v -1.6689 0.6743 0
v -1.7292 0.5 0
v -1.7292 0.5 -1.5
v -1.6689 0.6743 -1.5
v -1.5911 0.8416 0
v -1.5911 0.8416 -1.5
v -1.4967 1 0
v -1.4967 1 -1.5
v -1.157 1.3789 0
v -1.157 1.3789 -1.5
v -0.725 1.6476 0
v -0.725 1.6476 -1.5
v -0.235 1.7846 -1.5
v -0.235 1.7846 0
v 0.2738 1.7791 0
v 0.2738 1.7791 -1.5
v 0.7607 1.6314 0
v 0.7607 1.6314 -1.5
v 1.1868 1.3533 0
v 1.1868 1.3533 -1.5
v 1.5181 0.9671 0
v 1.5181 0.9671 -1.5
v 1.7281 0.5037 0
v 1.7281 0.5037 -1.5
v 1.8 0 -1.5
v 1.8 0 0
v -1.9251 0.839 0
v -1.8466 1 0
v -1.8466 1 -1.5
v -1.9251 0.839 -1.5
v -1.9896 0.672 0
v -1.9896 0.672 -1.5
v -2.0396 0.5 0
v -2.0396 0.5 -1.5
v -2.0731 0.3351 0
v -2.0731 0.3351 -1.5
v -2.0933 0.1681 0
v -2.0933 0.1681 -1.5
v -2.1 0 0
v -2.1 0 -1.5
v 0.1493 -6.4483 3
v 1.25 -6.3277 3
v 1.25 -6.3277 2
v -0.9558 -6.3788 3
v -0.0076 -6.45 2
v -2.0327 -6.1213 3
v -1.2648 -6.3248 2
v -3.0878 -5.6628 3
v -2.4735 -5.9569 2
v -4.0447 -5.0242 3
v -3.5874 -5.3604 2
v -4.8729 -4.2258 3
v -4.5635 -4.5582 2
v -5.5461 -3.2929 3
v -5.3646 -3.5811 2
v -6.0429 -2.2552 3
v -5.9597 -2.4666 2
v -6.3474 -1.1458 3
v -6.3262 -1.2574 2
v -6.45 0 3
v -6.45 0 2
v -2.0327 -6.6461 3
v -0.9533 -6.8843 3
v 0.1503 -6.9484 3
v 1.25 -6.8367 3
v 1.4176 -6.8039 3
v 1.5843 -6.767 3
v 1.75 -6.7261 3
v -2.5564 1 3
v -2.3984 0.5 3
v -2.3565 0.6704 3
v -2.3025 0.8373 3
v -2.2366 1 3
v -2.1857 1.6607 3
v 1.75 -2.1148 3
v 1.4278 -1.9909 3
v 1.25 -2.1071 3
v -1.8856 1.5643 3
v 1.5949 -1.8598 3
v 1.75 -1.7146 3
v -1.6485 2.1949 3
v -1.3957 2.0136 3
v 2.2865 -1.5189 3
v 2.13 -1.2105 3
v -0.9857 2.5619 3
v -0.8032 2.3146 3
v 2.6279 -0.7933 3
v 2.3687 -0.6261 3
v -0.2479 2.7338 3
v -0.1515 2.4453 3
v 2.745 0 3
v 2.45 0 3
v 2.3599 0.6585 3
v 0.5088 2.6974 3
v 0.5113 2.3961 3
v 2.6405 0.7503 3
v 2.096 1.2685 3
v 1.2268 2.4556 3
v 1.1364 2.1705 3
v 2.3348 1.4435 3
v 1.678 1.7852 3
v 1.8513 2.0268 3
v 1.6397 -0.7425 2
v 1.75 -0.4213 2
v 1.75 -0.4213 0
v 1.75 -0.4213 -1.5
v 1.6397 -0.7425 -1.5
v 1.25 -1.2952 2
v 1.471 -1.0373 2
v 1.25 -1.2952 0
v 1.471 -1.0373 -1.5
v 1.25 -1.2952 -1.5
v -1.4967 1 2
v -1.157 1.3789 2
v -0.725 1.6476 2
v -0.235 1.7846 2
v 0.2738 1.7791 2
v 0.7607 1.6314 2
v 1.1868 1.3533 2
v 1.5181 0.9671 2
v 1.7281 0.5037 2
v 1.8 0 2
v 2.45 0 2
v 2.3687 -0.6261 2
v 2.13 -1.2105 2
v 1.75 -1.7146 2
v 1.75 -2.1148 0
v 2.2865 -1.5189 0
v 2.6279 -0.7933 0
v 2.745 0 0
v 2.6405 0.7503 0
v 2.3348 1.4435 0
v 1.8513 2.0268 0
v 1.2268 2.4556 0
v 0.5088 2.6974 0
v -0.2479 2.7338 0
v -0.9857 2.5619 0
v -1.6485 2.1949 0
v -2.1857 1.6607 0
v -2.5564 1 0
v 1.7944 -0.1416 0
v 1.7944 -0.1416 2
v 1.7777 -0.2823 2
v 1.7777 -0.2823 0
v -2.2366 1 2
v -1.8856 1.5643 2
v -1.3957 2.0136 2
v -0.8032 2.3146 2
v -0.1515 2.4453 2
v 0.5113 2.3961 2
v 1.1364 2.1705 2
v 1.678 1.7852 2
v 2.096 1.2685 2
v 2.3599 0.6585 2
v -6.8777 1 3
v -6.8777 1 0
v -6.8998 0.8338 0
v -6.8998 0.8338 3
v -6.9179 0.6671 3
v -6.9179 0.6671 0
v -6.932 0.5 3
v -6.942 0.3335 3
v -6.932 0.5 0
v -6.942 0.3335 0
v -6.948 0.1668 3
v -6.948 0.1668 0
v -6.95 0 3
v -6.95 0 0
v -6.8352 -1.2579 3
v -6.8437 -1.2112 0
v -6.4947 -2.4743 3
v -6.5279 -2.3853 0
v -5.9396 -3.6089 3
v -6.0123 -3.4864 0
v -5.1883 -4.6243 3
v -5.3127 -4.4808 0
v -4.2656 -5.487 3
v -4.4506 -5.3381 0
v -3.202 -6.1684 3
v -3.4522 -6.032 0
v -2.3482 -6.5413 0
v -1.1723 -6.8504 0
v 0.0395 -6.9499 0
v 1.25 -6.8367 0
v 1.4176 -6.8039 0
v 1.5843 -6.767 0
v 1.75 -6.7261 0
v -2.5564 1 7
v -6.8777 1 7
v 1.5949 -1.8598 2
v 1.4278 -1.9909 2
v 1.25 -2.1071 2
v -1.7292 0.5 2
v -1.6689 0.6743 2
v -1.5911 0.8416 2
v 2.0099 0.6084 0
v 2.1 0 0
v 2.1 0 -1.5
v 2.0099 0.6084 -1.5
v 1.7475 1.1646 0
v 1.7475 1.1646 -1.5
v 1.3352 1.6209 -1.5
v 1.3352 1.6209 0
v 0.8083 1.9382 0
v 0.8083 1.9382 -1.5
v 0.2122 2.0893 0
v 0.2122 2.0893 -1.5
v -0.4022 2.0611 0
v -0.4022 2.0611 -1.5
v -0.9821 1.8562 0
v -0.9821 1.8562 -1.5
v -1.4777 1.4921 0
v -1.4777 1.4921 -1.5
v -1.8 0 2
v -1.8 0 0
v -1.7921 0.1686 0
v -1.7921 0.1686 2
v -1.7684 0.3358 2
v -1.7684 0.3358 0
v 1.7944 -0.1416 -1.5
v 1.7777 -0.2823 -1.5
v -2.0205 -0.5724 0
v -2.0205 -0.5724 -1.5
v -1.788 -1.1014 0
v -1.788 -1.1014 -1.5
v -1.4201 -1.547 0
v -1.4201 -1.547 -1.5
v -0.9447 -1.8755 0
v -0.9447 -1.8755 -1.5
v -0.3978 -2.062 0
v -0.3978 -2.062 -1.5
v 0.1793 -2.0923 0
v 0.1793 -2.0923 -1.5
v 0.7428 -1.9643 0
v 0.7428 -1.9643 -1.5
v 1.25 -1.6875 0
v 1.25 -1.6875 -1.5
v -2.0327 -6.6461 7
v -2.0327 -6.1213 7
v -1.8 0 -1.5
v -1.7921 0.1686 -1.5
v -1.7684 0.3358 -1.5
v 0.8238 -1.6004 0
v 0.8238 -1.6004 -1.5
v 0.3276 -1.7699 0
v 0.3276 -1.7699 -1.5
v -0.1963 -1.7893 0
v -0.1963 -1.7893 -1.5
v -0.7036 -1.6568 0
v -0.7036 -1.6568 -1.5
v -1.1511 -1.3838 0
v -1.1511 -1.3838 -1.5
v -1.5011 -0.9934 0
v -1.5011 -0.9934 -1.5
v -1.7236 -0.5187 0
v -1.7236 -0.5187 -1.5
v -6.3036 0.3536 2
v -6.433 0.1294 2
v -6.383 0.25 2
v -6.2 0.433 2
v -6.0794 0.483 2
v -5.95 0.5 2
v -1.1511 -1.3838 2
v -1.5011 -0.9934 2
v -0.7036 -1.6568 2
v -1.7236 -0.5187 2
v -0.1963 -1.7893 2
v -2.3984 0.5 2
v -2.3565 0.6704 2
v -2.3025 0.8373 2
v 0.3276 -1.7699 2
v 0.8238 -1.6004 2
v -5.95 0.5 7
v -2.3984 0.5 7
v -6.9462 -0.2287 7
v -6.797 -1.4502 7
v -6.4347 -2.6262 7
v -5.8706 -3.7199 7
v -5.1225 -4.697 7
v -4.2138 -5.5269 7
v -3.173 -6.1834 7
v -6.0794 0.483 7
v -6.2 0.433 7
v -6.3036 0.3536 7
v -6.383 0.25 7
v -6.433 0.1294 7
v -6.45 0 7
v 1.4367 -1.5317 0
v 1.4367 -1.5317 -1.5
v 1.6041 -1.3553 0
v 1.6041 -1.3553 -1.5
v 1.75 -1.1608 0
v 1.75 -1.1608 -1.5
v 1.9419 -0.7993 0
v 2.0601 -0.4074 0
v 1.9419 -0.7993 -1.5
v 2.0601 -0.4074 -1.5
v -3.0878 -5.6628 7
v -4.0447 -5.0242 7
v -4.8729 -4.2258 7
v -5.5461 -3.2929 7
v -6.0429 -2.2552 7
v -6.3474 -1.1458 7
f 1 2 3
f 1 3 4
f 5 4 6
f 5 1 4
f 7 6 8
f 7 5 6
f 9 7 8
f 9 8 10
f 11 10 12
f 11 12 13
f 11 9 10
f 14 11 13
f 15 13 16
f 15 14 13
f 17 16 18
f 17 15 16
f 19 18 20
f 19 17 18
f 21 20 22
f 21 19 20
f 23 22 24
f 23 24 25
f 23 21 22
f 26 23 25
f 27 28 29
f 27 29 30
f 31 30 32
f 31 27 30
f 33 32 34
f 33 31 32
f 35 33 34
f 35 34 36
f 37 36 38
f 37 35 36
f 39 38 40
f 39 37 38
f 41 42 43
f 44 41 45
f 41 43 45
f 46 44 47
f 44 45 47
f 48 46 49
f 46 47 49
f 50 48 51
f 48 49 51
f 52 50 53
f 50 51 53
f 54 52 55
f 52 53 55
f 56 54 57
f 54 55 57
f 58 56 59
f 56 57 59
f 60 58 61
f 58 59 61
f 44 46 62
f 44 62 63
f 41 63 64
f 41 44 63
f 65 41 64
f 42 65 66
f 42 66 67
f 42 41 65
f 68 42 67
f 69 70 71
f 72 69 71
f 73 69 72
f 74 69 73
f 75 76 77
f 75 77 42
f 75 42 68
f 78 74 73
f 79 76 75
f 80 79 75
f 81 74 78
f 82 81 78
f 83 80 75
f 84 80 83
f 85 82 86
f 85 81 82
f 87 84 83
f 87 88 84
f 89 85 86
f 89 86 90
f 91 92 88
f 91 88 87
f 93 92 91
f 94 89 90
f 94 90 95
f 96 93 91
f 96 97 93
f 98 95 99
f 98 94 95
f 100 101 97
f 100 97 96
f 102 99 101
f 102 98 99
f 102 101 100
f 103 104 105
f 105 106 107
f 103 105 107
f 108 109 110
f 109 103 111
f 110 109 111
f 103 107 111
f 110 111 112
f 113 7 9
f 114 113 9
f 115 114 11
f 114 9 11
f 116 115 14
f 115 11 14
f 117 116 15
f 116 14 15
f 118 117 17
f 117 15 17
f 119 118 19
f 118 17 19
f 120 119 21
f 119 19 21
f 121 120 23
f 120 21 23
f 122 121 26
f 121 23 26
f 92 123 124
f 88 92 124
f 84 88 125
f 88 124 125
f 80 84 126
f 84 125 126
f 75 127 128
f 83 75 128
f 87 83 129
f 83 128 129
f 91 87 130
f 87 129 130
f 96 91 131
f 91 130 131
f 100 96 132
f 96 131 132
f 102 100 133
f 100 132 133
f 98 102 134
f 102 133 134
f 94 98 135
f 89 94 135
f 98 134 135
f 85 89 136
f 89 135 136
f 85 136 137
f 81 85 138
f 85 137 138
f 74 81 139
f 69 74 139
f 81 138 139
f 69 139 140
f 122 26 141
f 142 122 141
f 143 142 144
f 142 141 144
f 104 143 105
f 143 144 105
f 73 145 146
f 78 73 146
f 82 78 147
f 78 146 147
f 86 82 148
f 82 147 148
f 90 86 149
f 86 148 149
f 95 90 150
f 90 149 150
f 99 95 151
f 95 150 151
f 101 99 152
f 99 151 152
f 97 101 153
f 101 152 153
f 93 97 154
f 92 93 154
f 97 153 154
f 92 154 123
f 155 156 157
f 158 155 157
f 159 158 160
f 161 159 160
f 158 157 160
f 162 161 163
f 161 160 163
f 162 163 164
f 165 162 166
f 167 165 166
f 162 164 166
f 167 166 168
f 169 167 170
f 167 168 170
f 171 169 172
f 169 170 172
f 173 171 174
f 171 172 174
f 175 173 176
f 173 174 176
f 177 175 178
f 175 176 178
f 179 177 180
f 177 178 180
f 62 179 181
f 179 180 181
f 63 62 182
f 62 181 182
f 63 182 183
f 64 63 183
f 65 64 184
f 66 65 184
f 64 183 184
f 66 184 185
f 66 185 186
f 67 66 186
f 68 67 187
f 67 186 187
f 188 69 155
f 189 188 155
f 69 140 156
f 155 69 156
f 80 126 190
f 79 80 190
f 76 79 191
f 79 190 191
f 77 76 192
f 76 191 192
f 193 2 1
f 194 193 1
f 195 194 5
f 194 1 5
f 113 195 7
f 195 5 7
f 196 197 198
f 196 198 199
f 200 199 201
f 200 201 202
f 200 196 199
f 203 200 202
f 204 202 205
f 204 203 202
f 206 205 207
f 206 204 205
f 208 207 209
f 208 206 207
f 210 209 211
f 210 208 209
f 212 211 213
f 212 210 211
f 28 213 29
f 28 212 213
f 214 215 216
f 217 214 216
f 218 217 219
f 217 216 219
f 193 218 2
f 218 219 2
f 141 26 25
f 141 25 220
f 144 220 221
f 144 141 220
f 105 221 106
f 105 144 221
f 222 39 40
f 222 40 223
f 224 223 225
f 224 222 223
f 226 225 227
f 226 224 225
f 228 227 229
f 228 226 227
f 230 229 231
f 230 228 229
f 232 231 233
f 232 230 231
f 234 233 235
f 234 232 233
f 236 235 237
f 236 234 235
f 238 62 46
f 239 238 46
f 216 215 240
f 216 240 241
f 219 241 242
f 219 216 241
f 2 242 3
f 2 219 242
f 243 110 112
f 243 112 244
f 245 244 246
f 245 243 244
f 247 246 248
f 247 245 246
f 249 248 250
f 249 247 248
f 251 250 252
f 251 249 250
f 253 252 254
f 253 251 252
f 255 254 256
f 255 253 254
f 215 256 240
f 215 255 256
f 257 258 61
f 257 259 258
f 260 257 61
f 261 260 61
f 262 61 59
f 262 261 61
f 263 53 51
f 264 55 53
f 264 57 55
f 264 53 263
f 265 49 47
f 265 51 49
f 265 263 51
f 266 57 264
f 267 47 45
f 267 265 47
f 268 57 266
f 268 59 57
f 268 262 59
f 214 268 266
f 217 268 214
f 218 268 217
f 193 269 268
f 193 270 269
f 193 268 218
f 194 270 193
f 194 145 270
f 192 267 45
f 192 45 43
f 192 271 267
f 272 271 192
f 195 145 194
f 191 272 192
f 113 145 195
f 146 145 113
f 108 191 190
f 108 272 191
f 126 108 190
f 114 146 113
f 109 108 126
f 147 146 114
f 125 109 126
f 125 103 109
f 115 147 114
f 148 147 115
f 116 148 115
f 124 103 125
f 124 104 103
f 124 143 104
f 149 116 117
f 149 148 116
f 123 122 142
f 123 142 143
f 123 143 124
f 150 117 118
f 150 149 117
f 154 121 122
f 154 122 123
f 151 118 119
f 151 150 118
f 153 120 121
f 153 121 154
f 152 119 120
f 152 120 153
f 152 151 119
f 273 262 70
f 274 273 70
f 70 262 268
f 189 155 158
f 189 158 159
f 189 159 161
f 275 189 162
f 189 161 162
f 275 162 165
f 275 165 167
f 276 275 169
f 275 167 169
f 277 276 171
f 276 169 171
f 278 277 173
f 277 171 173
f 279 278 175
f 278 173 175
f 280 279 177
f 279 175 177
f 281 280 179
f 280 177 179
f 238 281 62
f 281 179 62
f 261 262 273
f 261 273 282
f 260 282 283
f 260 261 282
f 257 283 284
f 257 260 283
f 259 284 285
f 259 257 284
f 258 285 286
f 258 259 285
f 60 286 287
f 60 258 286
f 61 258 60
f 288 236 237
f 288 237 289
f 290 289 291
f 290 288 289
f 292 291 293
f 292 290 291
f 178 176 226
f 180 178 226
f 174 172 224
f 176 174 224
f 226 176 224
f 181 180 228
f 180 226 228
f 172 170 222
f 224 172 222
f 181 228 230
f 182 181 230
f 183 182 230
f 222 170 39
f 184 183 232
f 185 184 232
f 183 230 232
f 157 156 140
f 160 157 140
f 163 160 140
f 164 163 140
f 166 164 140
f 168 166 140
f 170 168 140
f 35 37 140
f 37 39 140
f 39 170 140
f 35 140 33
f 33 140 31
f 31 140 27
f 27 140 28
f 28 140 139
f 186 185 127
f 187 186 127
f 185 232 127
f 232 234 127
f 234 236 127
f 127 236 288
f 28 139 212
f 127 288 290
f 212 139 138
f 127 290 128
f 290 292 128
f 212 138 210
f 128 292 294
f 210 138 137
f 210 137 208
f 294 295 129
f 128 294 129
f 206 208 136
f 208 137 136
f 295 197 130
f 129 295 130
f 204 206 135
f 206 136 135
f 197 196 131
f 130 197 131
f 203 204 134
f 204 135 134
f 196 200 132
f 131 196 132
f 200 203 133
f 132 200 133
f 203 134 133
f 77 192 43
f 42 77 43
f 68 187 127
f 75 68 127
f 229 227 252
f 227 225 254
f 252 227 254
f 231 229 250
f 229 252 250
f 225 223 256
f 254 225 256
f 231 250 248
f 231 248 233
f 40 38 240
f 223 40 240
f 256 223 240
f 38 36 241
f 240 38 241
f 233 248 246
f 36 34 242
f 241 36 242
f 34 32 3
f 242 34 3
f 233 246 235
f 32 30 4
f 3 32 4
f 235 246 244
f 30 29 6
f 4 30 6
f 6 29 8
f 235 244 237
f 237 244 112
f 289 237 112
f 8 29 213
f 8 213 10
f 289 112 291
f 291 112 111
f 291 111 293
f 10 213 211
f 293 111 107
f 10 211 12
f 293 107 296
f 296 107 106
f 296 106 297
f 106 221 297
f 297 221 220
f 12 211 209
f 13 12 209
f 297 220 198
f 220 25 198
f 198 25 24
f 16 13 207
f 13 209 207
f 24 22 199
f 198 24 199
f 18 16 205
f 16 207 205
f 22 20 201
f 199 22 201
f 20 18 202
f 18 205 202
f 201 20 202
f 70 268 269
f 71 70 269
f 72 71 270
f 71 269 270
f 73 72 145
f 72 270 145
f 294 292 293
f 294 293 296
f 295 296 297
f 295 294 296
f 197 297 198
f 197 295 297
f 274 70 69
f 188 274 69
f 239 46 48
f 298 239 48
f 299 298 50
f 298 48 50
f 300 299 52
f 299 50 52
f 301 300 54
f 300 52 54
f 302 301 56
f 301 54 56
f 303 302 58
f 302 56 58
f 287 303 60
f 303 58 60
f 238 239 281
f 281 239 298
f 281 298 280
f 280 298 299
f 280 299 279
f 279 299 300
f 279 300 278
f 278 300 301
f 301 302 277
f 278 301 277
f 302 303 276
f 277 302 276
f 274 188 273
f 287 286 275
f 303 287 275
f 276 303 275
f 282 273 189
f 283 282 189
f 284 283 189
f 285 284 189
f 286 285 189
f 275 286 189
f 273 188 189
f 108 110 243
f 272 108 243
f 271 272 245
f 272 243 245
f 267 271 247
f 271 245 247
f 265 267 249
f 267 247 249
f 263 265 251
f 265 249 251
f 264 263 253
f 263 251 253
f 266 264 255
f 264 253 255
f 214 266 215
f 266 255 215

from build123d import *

# Parameters (mm, degrees)
F1_DEPTH    = 2
F2_DEPTH    = 3
F3_DEPTH    = 1.5
F5_DEPTH    = 4
F6_T1_DEPTH = 6.2509414233


# Not quite as in the source:
# - a fillet or chamfer that OpenCascade refuses, or shapes differently, is made with other operations: its cross-section is extruded or revolved along the edge and cut away or added
# - a feature names something its author has since deleted; it is built from what else it names


with BuildPart() as f1:
    # F0 (on Top) → F1 (new body)
    with BuildSketch(Plane.XY):
        with BuildLine():
            ThreePointArc((-2.398436991, 0.5), (-2.3309771289, 0.7543511281), (-2.2366269246, 1))
            Line((-2.2366269246, 1), (-2.556369496, 1))
            ThreePointArc((-2.556369496, 1), (-2.6395896521, 0.7533866658), (-2.6990785465, 0.5))
            Line((-2.6990785465, 0.5), (-2.398436991, 0.5))
        make_face()
        with BuildLine():
            ThreePointArc((-2.2366269246, 1), (0.5112553348, 2.3960630173), (2.45, 0))
            ThreePointArc((2.45, 0), (2.2682592444, -0.9260129589), (1.75, -1.7146428199))
            Line((1.75, -1.7146428199), (1.75, -2.1148345089))
            ThreePointArc((1.75, -2.1148345089), (2.483825175, -1.1686049375), (2.745, 0))
            ThreePointArc((2.745, 0), (0.5088176164, 2.6974301906), (-2.556369496, 1))
            Line((-2.556369496, 1), (-2.2366269246, 1))
        make_face()
        with BuildLine():
            ThreePointArc((-2.6990785465, 0.5), (-2.6395896521, 0.7533866658), (-2.556369496, 1))
            Line((-2.556369496, 1), (-6.3720091023, 1))
            ThreePointArc((-6.3720091023, 1), (-6.4061799882, 0.7505717543), (-6.4305909526, 0.5))
            Line((-6.4305909526, 0.5), (-2.6990785465, 0.5))
        make_face()
        with BuildLine():
            ThreePointArc((-2.745, 0), (-2.7334955286, 0.2510521758), (-2.6990785465, 0.5))
            Line((-2.6990785465, 0.5), (-6.4305909526, 0.5))
            ThreePointArc((-6.4305909526, 0.5), (-6.4451459116, 0.2501882847), (-6.45, 0))
            Line((-6.45, 0), (-2.745, 0))
        make_face()
        with BuildLine():
            Line((1.25, -6.3277168078), (1.25, -2.4438749968))
            ThreePointArc((1.25, -2.4438749968), (-1.4324410983, -2.341610023), (-2.745, 0))
            Line((-2.745, 0), (-6.45, 0))
            ThreePointArc((-6.45, 0), (-4.0951190459, -4.9832218494), (1.25, -6.3277168078))
        make_face()
        with BuildLine():
            Line((1.25, -2.4438749968), (1.25, -2.1071307506))
            ThreePointArc((1.25, -2.1071307506), (-1.2124355653, -2.1289668856), (-2.45, 0))
            Line((-2.45, 0), (-2.745, 0))
            ThreePointArc((-2.745, 0), (-1.4324410983, -2.341610023), (1.25, -2.4438749968))
        make_face()
        with BuildLine():
            Line((1.75, -2.1148345089), (1.75, -1.7146428199))
            ThreePointArc((1.75, -1.7146428199), (1.5127827649, -1.927171063), (1.25, -2.1071307506))
            Line((1.25, -2.1071307506), (1.25, -2.4438749968))
            ThreePointArc((1.25, -2.4438749968), (1.5089953316, -2.2930237873), (1.75, -2.1148345089))
        make_face()
        with BuildLine():
            Line((1.75, -6.2080592781), (1.75, -2.1148345089))
            ThreePointArc((1.75, -2.1148345089), (1.5089953316, -2.2930237873), (1.25, -2.4438749968))
            Line((1.25, -2.4438749968), (1.25, -6.3277168078))
            ThreePointArc((1.25, -6.3277168078), (1.5011926862, -6.272871792), (1.75, -6.2080592781))
        make_face()
        with BuildLine():
            ThreePointArc((-6.4305909526, 0.5), (-6.4061799882, 0.7505717543), (-6.3720091023, 1))
            Line((-6.3720091023, 1), (-6.8776812953, 1))
            ThreePointArc((-6.8776812953, 1), (-6.9093605068, 0.7504914307), (-6.931991056, 0.5))
            Line((-6.931991056, 0.5), (-6.4305909526, 0.5))
        make_face()
        with BuildLine():
            Line((1.75, -6.7260686883), (1.75, -6.2080592781))
            ThreePointArc((1.75, -6.2080592781), (1.5011926862, -6.272871792), (1.25, -6.3277168078))
            Line((1.25, -6.3277168078), (1.25, -6.8366658541))
            ThreePointArc((1.25, -6.8366658541), (1.501018965, -6.7859739218), (1.75, -6.7260686883))
        make_face()
        with BuildLine():
            Line((1.25, -6.8366658541), (1.25, -6.3277168078))
            ThreePointArc((1.25, -6.3277168078), (-4.0951190459, -4.9832218494), (-6.45, 0))
            Line((-6.45, 0), (-6.95, 0))
            ThreePointArc((-6.95, 0), (-4.4505617623, -5.3380708126), (1.25, -6.8366658541))
        make_face()
        with BuildLine():
            ThreePointArc((-6.45, 0), (-6.4451459116, 0.2501882847), (-6.4305909526, 0.5))
            Line((-6.4305909526, 0.5), (-6.931991056, 0.5))
            ThreePointArc((-6.931991056, 0.5), (-6.9454963048, 0.2501621085), (-6.95, 0))
            Line((-6.95, 0), (-6.45, 0))
        make_face()
        with BuildLine():
            ThreePointArc((-2.45, 0), (-2.4370751556, 0.2513258562), (-2.398436991, 0.5))
            Line((-2.398436991, 0.5), (-2.6990785465, 0.5))
            ThreePointArc((-2.6990785465, 0.5), (-2.7334955286, 0.2510521758), (-2.745, 0))
            Line((-2.745, 0), (-2.45, 0))
        make_face()
        with BuildLine():
            ThreePointArc((-2.45, 0), (-1.2124355653, -2.1289668856), (1.25, -2.1071307506))
            Line((1.25, -2.1071307506), (1.25, -1.6874537031))
            ThreePointArc((1.25, -1.6874537031), (-0.9447221814, -1.8754999334), (-2.1, 0))
            Line((-2.1, 0), (-2.45, 0))
        make_face()
        with BuildLine():
            ThreePointArc((-2.1, 0), (-0.9447221814, -1.8754999334), (1.25, -1.6874537031))
            Line((1.25, -1.6874537031), (1.25, -1.2951833847))
            ThreePointArc((1.25, -1.2951833847), (-0.703562364, -1.6568041526), (-1.8, 0))
            Line((-1.8, 0), (-2.1, 0))
        make_face()
        with BuildLine():
            Line((-2.0396078054, 0.5), (-2.398436991, 0.5))
            ThreePointArc((-2.398436991, 0.5), (-2.4370751556, 0.2513258562), (-2.45, 0))
            Line((-2.45, 0), (-2.1, 0))
            ThreePointArc((-2.1, 0), (-2.0848472835, 0.2518170056), (-2.0396078054, 0.5))
        make_face()
        with BuildLine():
            Line((-1.8466185313, 1), (-2.2366269246, 1))
            ThreePointArc((-2.2366269246, 1), (-2.3309771289, 0.7543511281), (-2.398436991, 0.5))
            Line((-2.398436991, 0.5), (-2.0396078054, 0.5))
            ThreePointArc((-2.0396078054, 0.5), (-1.9591295988, 0.7561819986), (-1.8466185313, 1))
        make_face()
        with BuildLine():
            Line((2.1, 0), (2.45, 0))
            ThreePointArc((2.45, 0), (0.5112553348, 2.3960630173), (-2.2366269246, 1))
            Line((-2.2366269246, 1), (-1.8466185313, 1))
            ThreePointArc((-1.8466185313, 1), (0.5158008745, 2.0356692899), (2.1, 0))
        make_face()
        with BuildLine():
            Line((-1.7291616466, 0.5), (-2.0396078054, 0.5))
            ThreePointArc((-2.0396078054, 0.5), (-2.0848472835, 0.2518170056), (-2.1, 0))
            Line((-2.1, 0), (-1.8, 0))
            ThreePointArc((-1.8, 0), (-1.7822024245, 0.2524965704), (-1.7291616466, 0.5))
        make_face()
        with BuildLine():
            Line((-1.4966629547, 1), (-1.8466185313, 1))
            ThreePointArc((-1.8466185313, 1), (-1.9591295988, 0.7561819986), (-2.0396078054, 0.5))
            Line((-2.0396078054, 0.5), (-1.7291616466, 0.5))
            ThreePointArc((-1.7291616466, 0.5), (-1.6321721997, 0.7589558027), (-1.4966629547, 1))
        make_face()
        with BuildLine():
            Line((1.8, 0), (2.1, 0))
            ThreePointArc((2.1, 0), (0.5158008745, 2.0356692899), (-1.8466185313, 1))
            Line((-1.8466185313, 1), (-1.4966629547, 1))
            ThreePointArc((-1.4966629547, 1), (0.522497216, 1.722497216), (1.8, 0))
        make_face()
        with BuildLine():
            ThreePointArc((1.25, -1.6874537031), (1.5229366739, -1.4459128214), (1.75, -1.1608186766))
            Line((1.75, -1.1608186766), (1.75, -0.4213074887))
            ThreePointArc((1.75, -0.4213074887), (1.5623427186, -0.8939156725), (1.25, -1.2951833847))
            Line((1.25, -1.2951833847), (1.25, -1.6874537031))
        make_face()
        with BuildLine():
            ThreePointArc((1.25, -2.1071307506), (1.5127827649, -1.927171063), (1.75, -1.7146428199))
            Line((1.75, -1.7146428199), (1.75, -1.1608186766))
            ThreePointArc((1.75, -1.1608186766), (1.5229366739, -1.4459128214), (1.25, -1.6874537031))
            Line((1.25, -1.6874537031), (1.25, -2.1071307506))
        make_face()
        with BuildLine():
            ThreePointArc((1.75, -1.1608186766), (2.0105969263, -0.6062177826), (2.1, 0))
            Line((2.1, 0), (1.8, 0))
            ThreePointArc((1.8, 0), (1.7874562932, -0.2121320344), (1.75, -0.4213074887))
            Line((1.75, -0.4213074887), (1.75, -1.1608186766))
        make_face()
        with BuildLine():
            ThreePointArc((1.75, -1.7146428199), (2.2682592444, -0.9260129589), (2.45, 0))
            Line((2.45, 0), (2.1, 0))
            ThreePointArc((2.1, 0), (2.0105969263, -0.6062177826), (1.75, -1.1608186766))
            Line((1.75, -1.1608186766), (1.75, -1.7146428199))
        make_face()
    extrude(amount=F1_DEPTH)

    # F0 (on Top) → F2 (join)
    with BuildSketch(Plane.XY):
        with BuildLine():
            ThreePointArc((-6.4305909526, 0.5), (-6.4061799882, 0.7505717543), (-6.3720091023, 1))
            Line((-6.3720091023, 1), (-6.8776812953, 1))
            ThreePointArc((-6.8776812953, 1), (-6.9093605068, 0.7504914307), (-6.931991056, 0.5))
            Line((-6.931991056, 0.5), (-6.4305909526, 0.5))
        make_face()
        with BuildLine():
            ThreePointArc((-2.6990785465, 0.5), (-2.6395896521, 0.7533866658), (-2.556369496, 1))
            Line((-2.556369496, 1), (-6.3720091023, 1))
            ThreePointArc((-6.3720091023, 1), (-6.4061799882, 0.7505717543), (-6.4305909526, 0.5))
            Line((-6.4305909526, 0.5), (-2.6990785465, 0.5))
        make_face()
        with BuildLine():
            ThreePointArc((-2.398436991, 0.5), (-2.3309771289, 0.7543511281), (-2.2366269246, 1))
            Line((-2.2366269246, 1), (-2.556369496, 1))
            ThreePointArc((-2.556369496, 1), (-2.6395896521, 0.7533866658), (-2.6990785465, 0.5))
            Line((-2.6990785465, 0.5), (-2.398436991, 0.5))
        make_face()
        with BuildLine():
            ThreePointArc((-2.2366269246, 1), (0.5112553348, 2.3960630173), (2.45, 0))
            ThreePointArc((2.45, 0), (2.2682592444, -0.9260129589), (1.75, -1.7146428199))
            Line((1.75, -1.7146428199), (1.75, -2.1148345089))
            ThreePointArc((1.75, -2.1148345089), (2.483825175, -1.1686049375), (2.745, 0))
            ThreePointArc((2.745, 0), (0.5088176164, 2.6974301906), (-2.556369496, 1))
            Line((-2.556369496, 1), (-2.2366269246, 1))
        make_face()
        with BuildLine():
            Line((1.75, -2.1148345089), (1.75, -1.7146428199))
            ThreePointArc((1.75, -1.7146428199), (1.5127827649, -1.927171063), (1.25, -2.1071307506))
            Line((1.25, -2.1071307506), (1.25, -2.4438749968))
            ThreePointArc((1.25, -2.4438749968), (1.5089953316, -2.2930237873), (1.75, -2.1148345089))
        make_face()
        with BuildLine():
            Line((1.75, -6.2080592781), (1.75, -2.1148345089))
            ThreePointArc((1.75, -2.1148345089), (1.5089953316, -2.2930237873), (1.25, -2.4438749968))
            Line((1.25, -2.4438749968), (1.25, -6.3277168078))
            ThreePointArc((1.25, -6.3277168078), (1.5011926862, -6.272871792), (1.75, -6.2080592781))
        make_face()
        with BuildLine():
            Line((1.75, -6.7260686883), (1.75, -6.2080592781))
            ThreePointArc((1.75, -6.2080592781), (1.5011926862, -6.272871792), (1.25, -6.3277168078))
            Line((1.25, -6.3277168078), (1.25, -6.8366658541))
            ThreePointArc((1.25, -6.8366658541), (1.501018965, -6.7859739218), (1.75, -6.7260686883))
        make_face()
        with BuildLine():
            Line((1.25, -6.8366658541), (1.25, -6.3277168078))
            ThreePointArc((1.25, -6.3277168078), (-4.0951190459, -4.9832218494), (-6.45, 0))
            Line((-6.45, 0), (-6.95, 0))
            ThreePointArc((-6.95, 0), (-4.4505617623, -5.3380708126), (1.25, -6.8366658541))
        make_face()
        with BuildLine():
            ThreePointArc((-6.45, 0), (-6.4451459116, 0.2501882847), (-6.4305909526, 0.5))
            Line((-6.4305909526, 0.5), (-6.931991056, 0.5))
            ThreePointArc((-6.931991056, 0.5), (-6.9454963048, 0.2501621085), (-6.95, 0))
            Line((-6.95, 0), (-6.45, 0))
        make_face()
    extrude(amount=F2_DEPTH)

    # F0 (on Top) → F3 (join)
    with BuildSketch(Plane.XY):
        with BuildLine():
            Line((1.8, 0), (2.1, 0))
            ThreePointArc((2.1, 0), (0.5158008745, 2.0356692899), (-1.8466185313, 1))
            Line((-1.8466185313, 1), (-1.4966629547, 1))
            ThreePointArc((-1.4966629547, 1), (0.522497216, 1.722497216), (1.8, 0))
        make_face()
        with BuildLine():
            Line((-1.4966629547, 1), (-1.8466185313, 1))
            ThreePointArc((-1.8466185313, 1), (-1.9591295988, 0.7561819986), (-2.0396078054, 0.5))
            Line((-2.0396078054, 0.5), (-1.7291616466, 0.5))
            ThreePointArc((-1.7291616466, 0.5), (-1.6321721997, 0.7589558027), (-1.4966629547, 1))
        make_face()
        with BuildLine():
            Line((-1.7291616466, 0.5), (-2.0396078054, 0.5))
            ThreePointArc((-2.0396078054, 0.5), (-2.0848472835, 0.2518170056), (-2.1, 0))
            Line((-2.1, 0), (-1.8, 0))
            ThreePointArc((-1.8, 0), (-1.7822024245, 0.2524965704), (-1.7291616466, 0.5))
        make_face()
        with BuildLine():
            ThreePointArc((-2.1, 0), (-0.9447221814, -1.8754999334), (1.25, -1.6874537031))
            Line((1.25, -1.6874537031), (1.25, -1.2951833847))
            ThreePointArc((1.25, -1.2951833847), (-0.703562364, -1.6568041526), (-1.8, 0))
            Line((-1.8, 0), (-2.1, 0))
        make_face()
        with BuildLine():
            ThreePointArc((1.25, -1.6874537031), (1.5229366739, -1.4459128214), (1.75, -1.1608186766))
            Line((1.75, -1.1608186766), (1.75, -0.4213074887))
            ThreePointArc((1.75, -0.4213074887), (1.5623427186, -0.8939156725), (1.25, -1.2951833847))
            Line((1.25, -1.2951833847), (1.25, -1.6874537031))
        make_face()
        with BuildLine():
            ThreePointArc((1.75, -1.1608186766), (2.0105969263, -0.6062177826), (2.1, 0))
            Line((2.1, 0), (1.8, 0))
            ThreePointArc((1.8, 0), (1.7874562932, -0.2121320344), (1.75, -0.4213074887))
            Line((1.75, -0.4213074887), (1.75, -1.1608186766))
        make_face()
    extrude(amount=-F3_DEPTH)

    # F4 (on face) → F5 (join)
    with BuildSketch(Plane.XY.offset(3)):
        with BuildLine():
            Line((-2.398436991, 0.5), (-2.556369496, 1))
            Line((-2.556369496, 1), (-6.8776812953, 1))
            ThreePointArc((-6.8776812953, 1), (-5.8706460858, -3.7199481898), (-2.0327166243, -6.6460938246))
            Line((-2.0327166243, -6.6460938246), (-2.0327166243, -6.1213203743))
            ThreePointArc((-2.0327166243, -6.1213203743), (-5.3728358118, -3.5686321385), (-6.4305909526, 0.5))
            Line((-6.4305909526, 0.5), (-2.398436991, 0.5))
        make_face()
    extrude(amount=F5_DEPTH)

    # F6: fillet of radius 0.5 on 1 edges, made by hand

    # F6_s2 → F6_t1 (join)
    with BuildSketch(Plane.XY.offset(0.7490585767)):
        with BuildLine():
            ThreePointArc((-5.95, 0.5), (-6.3035533906, 0.3535533906), (-6.45, 0))
            ThreePointArc((-6.45, 0), (-6.4451459116, 0.2501882847), (-6.4305909526, 0.5))
            Line((-6.4305909526, 0.5), (-5.95, 0.5))
        make_face()
    extrude(amount=F6_T1_DEPTH)


solid = f1.part
